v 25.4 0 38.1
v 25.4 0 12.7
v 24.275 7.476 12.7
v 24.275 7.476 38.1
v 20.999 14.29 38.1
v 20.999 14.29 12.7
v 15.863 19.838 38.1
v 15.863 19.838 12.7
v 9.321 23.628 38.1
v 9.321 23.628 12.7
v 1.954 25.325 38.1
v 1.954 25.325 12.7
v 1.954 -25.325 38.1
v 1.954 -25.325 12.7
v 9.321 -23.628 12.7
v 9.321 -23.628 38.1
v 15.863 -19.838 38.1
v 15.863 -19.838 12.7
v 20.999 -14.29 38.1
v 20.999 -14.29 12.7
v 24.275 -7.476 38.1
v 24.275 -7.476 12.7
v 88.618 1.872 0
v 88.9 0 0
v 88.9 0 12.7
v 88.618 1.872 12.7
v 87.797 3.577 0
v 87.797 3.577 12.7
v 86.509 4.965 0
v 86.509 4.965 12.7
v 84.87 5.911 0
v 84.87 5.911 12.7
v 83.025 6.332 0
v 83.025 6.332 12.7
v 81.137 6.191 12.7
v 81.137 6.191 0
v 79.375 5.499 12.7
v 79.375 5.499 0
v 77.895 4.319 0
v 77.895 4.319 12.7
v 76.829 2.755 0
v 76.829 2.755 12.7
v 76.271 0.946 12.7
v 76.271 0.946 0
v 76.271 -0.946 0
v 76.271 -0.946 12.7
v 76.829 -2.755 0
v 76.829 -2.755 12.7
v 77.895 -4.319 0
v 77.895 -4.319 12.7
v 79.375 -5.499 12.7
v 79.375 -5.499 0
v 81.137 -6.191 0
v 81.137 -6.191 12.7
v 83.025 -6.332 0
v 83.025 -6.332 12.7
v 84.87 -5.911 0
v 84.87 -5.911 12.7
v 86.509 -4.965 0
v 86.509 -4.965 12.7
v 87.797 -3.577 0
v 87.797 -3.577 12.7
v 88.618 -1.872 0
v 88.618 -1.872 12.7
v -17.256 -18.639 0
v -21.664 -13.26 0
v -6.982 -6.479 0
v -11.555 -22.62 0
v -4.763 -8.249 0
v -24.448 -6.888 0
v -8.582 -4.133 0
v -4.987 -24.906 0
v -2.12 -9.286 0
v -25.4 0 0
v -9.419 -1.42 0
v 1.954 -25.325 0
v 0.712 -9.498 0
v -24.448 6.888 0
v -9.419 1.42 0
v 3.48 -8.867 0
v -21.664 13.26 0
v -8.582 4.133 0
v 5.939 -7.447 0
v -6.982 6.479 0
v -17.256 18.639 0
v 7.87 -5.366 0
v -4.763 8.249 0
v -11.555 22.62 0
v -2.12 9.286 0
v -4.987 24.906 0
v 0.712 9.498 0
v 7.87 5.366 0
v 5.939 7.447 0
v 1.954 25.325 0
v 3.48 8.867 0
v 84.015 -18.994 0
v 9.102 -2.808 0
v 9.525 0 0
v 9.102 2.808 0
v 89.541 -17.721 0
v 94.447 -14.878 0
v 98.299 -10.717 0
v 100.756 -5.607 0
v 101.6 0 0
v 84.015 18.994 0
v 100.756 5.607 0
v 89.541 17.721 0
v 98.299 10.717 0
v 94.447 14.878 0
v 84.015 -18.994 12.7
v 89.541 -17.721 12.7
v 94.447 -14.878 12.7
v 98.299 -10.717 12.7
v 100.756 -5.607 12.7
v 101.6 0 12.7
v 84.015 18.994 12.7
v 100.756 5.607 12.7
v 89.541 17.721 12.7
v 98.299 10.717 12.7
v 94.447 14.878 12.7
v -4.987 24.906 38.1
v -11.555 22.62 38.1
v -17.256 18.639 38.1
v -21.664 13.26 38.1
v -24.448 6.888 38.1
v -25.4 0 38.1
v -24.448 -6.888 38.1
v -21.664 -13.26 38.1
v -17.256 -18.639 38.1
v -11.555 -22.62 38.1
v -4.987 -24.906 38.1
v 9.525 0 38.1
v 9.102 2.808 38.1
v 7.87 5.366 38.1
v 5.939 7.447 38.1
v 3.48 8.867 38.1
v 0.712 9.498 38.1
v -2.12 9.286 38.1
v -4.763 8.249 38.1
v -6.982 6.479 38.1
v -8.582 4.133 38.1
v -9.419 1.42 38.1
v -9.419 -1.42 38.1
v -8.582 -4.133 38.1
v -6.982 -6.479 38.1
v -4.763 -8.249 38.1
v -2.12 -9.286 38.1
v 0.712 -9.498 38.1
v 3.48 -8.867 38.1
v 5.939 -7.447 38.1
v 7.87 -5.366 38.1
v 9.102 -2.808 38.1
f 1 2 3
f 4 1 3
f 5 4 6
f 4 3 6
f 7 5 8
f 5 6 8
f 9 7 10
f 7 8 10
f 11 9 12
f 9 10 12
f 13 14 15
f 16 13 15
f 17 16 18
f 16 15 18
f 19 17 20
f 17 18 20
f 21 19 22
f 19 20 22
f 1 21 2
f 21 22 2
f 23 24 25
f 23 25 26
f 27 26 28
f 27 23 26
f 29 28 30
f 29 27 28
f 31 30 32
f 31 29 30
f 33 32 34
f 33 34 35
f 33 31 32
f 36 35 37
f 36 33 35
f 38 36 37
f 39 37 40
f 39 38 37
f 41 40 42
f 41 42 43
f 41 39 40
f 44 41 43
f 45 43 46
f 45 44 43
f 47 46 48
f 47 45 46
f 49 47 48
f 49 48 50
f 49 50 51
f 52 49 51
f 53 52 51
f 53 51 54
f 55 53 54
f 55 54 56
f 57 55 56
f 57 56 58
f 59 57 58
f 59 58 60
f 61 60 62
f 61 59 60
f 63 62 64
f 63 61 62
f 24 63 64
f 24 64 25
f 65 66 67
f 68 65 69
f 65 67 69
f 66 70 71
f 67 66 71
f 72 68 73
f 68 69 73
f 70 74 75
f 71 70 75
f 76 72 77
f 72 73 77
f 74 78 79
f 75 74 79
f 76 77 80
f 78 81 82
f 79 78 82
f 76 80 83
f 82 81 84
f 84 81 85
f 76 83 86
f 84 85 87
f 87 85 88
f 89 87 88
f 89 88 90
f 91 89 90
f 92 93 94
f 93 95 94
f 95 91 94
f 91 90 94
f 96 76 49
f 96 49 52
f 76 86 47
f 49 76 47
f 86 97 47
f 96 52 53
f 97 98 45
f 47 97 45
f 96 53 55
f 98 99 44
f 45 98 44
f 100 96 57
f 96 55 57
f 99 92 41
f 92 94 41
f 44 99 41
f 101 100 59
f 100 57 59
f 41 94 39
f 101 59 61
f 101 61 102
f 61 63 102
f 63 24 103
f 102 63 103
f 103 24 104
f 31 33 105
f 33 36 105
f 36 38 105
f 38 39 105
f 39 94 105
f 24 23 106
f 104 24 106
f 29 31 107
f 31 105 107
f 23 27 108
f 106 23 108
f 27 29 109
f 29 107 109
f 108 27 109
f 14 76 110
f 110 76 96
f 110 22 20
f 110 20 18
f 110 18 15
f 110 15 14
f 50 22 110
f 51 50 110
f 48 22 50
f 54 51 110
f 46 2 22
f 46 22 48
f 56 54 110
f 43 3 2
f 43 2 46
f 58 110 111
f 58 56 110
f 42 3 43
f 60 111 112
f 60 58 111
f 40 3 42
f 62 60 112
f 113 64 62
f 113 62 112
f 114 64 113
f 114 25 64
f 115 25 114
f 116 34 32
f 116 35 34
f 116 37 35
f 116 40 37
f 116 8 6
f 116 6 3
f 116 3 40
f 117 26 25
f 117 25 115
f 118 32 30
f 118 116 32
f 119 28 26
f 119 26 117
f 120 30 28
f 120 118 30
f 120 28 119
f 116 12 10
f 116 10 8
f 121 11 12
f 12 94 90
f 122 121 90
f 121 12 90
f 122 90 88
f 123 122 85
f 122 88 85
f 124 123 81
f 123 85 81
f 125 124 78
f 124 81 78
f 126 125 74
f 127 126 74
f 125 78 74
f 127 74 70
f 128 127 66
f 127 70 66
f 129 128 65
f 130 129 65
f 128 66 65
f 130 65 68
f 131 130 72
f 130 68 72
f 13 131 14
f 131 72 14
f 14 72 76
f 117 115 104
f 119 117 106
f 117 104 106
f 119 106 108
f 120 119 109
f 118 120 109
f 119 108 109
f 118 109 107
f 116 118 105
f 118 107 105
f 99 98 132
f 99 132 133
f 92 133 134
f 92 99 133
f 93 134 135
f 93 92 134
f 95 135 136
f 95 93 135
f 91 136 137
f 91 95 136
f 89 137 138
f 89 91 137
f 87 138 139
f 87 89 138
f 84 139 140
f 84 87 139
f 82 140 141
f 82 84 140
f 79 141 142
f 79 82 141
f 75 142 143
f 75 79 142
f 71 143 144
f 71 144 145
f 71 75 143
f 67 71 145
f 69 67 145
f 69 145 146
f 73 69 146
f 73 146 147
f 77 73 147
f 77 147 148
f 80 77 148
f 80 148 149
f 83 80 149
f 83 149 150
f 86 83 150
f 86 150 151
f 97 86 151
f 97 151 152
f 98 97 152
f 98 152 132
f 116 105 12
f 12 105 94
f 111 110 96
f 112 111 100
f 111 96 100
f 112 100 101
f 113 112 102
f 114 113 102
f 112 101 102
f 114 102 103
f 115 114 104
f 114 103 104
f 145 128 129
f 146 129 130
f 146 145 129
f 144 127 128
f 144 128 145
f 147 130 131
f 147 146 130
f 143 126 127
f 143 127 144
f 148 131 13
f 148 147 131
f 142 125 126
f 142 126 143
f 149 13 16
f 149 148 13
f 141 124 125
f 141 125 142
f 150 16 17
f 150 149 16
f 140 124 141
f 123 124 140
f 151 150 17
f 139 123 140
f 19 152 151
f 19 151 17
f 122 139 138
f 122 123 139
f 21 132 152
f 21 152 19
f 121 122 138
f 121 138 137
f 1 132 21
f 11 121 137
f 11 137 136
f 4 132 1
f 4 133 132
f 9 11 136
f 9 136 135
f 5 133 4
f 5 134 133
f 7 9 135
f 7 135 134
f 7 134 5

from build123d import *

# Parameters (mm, degrees)
F0_R     = 9.525
F1_DEPTH = 38.1
F0_R_2   = 6.35
F2_DEPTH = 12.7


# Not quite as in the source:
# - a feature of the source that left no trace in its solid (it failed there, or was rolled back) is left out


with BuildPart() as f1:
    # F0 (on Top) → F1 (new body)
    with BuildSketch(Plane.XY):
        with BuildLine():
            ThreePointArc((1.9538461538, -25.3247405753), (18.6385043969, -17.2559020004), (25.4, 0))
            ThreePointArc((25.4, 0), (18.6385043969, 17.2559020004), (1.9538461538, 25.3247405753))
            ThreePointArc((1.9538461538, 25.3247405753), (-25.4, 0), (1.9538461538, -25.3247405753))
        make_face()
        Circle(F0_R, mode=Mode.SUBTRACT)
    extrude(amount=F1_DEPTH)

    # F0 (on Top) → F2 (join)
    with BuildSketch(Plane.XY):
        with BuildLine():
            ThreePointArc((1.9538461538, -25.3247405753), (18.6385043969, -17.2559020004), (25.4, 0))
            ThreePointArc((25.4, 0), (18.6385043969, 17.2559020004), (1.9538461538, 25.3247405753))
            ThreePointArc((1.9538461538, 25.3247405753), (-25.4, 0), (1.9538461538, -25.3247405753))
        make_face()
        Circle(F0_R, mode=Mode.SUBTRACT)
        with BuildLine():
            ThreePointArc((1.9538461538, 25.3247405753), (18.6385043969, 17.2559020004), (25.4, 0))
            ThreePointArc((25.4, 0), (18.6385043969, -17.2559020004), (1.9538461538, -25.3247405753))
            Line((1.9538461538, -25.3247405753), (84.0153846154, -18.9935554315))
            ThreePointArc((84.0153846154, -18.9935554315), (63.5, 0), (84.0153846154, 18.9935554315))
            Line((84.0153846154, 18.9935554315), (1.9538461538, 25.3247405753))
        make_face()
        with BuildLine():
            ThreePointArc((101.6, 0), (96.5288782977, 12.9419265003), (84.0153846154, 18.9935554315))
            ThreePointArc((84.0153846154, 18.9935554315), (63.5, 0), (84.0153846154, -18.9935554315))
            ThreePointArc((84.0153846154, -18.9935554315), (96.5288782977, -12.9419265003), (101.6, 0))
        make_face()
        with Locations((82.55, 0)):
            Circle(F0_R_2, mode=Mode.SUBTRACT)
    extrude(amount=F2_DEPTH)


solid = f1.part
